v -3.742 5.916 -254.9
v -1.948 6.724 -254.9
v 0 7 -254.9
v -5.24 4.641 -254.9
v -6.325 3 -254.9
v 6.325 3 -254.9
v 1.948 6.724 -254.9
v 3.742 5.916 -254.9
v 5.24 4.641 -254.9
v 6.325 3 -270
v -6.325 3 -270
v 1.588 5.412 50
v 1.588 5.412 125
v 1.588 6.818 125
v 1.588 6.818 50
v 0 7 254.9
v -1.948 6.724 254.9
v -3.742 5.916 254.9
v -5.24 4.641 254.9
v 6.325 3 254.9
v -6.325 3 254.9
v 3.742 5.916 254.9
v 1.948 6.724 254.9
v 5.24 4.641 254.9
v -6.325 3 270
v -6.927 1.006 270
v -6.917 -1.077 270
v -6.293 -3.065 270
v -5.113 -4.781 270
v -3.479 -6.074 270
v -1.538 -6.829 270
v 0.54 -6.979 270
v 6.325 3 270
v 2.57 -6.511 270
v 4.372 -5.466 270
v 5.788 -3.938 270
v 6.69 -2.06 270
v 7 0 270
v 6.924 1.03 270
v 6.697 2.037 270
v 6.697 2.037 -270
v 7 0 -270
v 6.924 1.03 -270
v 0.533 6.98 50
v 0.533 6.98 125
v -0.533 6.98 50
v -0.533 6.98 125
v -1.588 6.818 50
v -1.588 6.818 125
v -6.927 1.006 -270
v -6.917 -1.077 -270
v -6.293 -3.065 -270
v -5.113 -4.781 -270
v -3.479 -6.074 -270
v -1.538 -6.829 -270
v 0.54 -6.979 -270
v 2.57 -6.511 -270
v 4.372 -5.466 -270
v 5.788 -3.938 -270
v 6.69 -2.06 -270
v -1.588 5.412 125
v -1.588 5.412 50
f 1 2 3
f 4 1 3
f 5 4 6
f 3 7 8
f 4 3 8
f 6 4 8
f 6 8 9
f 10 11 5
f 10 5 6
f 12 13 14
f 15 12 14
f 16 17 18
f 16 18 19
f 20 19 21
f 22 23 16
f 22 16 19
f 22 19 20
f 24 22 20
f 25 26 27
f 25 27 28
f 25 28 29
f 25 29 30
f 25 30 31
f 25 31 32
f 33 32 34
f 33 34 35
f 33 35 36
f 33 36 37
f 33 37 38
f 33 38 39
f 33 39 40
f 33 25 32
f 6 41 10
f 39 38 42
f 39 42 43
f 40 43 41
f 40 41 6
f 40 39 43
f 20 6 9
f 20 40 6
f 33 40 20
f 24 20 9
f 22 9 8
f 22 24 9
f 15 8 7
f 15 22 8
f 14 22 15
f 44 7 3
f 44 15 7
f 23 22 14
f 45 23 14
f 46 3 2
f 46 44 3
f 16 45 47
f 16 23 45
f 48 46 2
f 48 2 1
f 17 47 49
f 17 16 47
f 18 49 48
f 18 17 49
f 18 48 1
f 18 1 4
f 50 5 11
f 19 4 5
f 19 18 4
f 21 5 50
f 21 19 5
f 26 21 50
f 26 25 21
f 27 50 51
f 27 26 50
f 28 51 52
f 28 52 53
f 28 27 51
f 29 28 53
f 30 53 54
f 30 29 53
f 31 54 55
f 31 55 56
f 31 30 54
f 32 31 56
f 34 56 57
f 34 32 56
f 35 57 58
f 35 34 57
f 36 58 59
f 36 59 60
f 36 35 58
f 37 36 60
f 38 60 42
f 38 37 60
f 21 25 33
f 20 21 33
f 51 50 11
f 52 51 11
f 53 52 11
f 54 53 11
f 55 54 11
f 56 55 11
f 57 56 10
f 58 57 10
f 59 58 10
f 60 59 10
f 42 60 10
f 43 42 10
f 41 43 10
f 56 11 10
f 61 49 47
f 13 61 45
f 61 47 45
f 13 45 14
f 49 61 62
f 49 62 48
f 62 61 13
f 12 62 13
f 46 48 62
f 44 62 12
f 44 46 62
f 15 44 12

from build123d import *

# Parameters (mm, degrees)
SKETCH1_R           = 7
BOSS_EXTRUDE1_DEPTH = 270
CUT_EXTRUDE1_DEPTH  = 15.1
CUT_EXTRUDE2_START  = -145
SKETCH3_W           = 3.175
SKETCH3_H           = 3.175
CUT_EXTRUDE2_DEPTH  = 75


with BuildPart() as part:
    # Sketch1 → Boss-Extrude1 (new, symmetric)
    with BuildSketch(Plane.XY):
        Circle(SKETCH1_R)
    extrude(amount=BOSS_EXTRUDE1_DEPTH, both=True)

    # Sketch2 → Cut-Extrude1 (cut)
    with BuildSketch(Plane.XY.offset(270)):
        with BuildLine():
            Line((-6.32455532, 3), (6.32455532, 3))
            ThreePointArc((6.32455532, 3), (0, 7), (-6.32455532, 3))
        make_face()
    cut_extrude1 = extrude(amount=-CUT_EXTRUDE1_DEPTH, mode=Mode.SUBTRACT)

    # Sketch3 → Cut-Extrude2 (cut)
    with BuildSketch(Plane.XY.offset(270).offset(CUT_EXTRUDE2_START)):
        with Locations((0, 7)):
            Rectangle(SKETCH3_W, SKETCH3_H)
    extrude(amount=-CUT_EXTRUDE2_DEPTH, mode=Mode.SUBTRACT)

    # Mirror1: Cut-Extrude1 across plane
    add(cut_extrude1.mirror(Plane.XY), mode=Mode.SUBTRACT)


solid = part.part
